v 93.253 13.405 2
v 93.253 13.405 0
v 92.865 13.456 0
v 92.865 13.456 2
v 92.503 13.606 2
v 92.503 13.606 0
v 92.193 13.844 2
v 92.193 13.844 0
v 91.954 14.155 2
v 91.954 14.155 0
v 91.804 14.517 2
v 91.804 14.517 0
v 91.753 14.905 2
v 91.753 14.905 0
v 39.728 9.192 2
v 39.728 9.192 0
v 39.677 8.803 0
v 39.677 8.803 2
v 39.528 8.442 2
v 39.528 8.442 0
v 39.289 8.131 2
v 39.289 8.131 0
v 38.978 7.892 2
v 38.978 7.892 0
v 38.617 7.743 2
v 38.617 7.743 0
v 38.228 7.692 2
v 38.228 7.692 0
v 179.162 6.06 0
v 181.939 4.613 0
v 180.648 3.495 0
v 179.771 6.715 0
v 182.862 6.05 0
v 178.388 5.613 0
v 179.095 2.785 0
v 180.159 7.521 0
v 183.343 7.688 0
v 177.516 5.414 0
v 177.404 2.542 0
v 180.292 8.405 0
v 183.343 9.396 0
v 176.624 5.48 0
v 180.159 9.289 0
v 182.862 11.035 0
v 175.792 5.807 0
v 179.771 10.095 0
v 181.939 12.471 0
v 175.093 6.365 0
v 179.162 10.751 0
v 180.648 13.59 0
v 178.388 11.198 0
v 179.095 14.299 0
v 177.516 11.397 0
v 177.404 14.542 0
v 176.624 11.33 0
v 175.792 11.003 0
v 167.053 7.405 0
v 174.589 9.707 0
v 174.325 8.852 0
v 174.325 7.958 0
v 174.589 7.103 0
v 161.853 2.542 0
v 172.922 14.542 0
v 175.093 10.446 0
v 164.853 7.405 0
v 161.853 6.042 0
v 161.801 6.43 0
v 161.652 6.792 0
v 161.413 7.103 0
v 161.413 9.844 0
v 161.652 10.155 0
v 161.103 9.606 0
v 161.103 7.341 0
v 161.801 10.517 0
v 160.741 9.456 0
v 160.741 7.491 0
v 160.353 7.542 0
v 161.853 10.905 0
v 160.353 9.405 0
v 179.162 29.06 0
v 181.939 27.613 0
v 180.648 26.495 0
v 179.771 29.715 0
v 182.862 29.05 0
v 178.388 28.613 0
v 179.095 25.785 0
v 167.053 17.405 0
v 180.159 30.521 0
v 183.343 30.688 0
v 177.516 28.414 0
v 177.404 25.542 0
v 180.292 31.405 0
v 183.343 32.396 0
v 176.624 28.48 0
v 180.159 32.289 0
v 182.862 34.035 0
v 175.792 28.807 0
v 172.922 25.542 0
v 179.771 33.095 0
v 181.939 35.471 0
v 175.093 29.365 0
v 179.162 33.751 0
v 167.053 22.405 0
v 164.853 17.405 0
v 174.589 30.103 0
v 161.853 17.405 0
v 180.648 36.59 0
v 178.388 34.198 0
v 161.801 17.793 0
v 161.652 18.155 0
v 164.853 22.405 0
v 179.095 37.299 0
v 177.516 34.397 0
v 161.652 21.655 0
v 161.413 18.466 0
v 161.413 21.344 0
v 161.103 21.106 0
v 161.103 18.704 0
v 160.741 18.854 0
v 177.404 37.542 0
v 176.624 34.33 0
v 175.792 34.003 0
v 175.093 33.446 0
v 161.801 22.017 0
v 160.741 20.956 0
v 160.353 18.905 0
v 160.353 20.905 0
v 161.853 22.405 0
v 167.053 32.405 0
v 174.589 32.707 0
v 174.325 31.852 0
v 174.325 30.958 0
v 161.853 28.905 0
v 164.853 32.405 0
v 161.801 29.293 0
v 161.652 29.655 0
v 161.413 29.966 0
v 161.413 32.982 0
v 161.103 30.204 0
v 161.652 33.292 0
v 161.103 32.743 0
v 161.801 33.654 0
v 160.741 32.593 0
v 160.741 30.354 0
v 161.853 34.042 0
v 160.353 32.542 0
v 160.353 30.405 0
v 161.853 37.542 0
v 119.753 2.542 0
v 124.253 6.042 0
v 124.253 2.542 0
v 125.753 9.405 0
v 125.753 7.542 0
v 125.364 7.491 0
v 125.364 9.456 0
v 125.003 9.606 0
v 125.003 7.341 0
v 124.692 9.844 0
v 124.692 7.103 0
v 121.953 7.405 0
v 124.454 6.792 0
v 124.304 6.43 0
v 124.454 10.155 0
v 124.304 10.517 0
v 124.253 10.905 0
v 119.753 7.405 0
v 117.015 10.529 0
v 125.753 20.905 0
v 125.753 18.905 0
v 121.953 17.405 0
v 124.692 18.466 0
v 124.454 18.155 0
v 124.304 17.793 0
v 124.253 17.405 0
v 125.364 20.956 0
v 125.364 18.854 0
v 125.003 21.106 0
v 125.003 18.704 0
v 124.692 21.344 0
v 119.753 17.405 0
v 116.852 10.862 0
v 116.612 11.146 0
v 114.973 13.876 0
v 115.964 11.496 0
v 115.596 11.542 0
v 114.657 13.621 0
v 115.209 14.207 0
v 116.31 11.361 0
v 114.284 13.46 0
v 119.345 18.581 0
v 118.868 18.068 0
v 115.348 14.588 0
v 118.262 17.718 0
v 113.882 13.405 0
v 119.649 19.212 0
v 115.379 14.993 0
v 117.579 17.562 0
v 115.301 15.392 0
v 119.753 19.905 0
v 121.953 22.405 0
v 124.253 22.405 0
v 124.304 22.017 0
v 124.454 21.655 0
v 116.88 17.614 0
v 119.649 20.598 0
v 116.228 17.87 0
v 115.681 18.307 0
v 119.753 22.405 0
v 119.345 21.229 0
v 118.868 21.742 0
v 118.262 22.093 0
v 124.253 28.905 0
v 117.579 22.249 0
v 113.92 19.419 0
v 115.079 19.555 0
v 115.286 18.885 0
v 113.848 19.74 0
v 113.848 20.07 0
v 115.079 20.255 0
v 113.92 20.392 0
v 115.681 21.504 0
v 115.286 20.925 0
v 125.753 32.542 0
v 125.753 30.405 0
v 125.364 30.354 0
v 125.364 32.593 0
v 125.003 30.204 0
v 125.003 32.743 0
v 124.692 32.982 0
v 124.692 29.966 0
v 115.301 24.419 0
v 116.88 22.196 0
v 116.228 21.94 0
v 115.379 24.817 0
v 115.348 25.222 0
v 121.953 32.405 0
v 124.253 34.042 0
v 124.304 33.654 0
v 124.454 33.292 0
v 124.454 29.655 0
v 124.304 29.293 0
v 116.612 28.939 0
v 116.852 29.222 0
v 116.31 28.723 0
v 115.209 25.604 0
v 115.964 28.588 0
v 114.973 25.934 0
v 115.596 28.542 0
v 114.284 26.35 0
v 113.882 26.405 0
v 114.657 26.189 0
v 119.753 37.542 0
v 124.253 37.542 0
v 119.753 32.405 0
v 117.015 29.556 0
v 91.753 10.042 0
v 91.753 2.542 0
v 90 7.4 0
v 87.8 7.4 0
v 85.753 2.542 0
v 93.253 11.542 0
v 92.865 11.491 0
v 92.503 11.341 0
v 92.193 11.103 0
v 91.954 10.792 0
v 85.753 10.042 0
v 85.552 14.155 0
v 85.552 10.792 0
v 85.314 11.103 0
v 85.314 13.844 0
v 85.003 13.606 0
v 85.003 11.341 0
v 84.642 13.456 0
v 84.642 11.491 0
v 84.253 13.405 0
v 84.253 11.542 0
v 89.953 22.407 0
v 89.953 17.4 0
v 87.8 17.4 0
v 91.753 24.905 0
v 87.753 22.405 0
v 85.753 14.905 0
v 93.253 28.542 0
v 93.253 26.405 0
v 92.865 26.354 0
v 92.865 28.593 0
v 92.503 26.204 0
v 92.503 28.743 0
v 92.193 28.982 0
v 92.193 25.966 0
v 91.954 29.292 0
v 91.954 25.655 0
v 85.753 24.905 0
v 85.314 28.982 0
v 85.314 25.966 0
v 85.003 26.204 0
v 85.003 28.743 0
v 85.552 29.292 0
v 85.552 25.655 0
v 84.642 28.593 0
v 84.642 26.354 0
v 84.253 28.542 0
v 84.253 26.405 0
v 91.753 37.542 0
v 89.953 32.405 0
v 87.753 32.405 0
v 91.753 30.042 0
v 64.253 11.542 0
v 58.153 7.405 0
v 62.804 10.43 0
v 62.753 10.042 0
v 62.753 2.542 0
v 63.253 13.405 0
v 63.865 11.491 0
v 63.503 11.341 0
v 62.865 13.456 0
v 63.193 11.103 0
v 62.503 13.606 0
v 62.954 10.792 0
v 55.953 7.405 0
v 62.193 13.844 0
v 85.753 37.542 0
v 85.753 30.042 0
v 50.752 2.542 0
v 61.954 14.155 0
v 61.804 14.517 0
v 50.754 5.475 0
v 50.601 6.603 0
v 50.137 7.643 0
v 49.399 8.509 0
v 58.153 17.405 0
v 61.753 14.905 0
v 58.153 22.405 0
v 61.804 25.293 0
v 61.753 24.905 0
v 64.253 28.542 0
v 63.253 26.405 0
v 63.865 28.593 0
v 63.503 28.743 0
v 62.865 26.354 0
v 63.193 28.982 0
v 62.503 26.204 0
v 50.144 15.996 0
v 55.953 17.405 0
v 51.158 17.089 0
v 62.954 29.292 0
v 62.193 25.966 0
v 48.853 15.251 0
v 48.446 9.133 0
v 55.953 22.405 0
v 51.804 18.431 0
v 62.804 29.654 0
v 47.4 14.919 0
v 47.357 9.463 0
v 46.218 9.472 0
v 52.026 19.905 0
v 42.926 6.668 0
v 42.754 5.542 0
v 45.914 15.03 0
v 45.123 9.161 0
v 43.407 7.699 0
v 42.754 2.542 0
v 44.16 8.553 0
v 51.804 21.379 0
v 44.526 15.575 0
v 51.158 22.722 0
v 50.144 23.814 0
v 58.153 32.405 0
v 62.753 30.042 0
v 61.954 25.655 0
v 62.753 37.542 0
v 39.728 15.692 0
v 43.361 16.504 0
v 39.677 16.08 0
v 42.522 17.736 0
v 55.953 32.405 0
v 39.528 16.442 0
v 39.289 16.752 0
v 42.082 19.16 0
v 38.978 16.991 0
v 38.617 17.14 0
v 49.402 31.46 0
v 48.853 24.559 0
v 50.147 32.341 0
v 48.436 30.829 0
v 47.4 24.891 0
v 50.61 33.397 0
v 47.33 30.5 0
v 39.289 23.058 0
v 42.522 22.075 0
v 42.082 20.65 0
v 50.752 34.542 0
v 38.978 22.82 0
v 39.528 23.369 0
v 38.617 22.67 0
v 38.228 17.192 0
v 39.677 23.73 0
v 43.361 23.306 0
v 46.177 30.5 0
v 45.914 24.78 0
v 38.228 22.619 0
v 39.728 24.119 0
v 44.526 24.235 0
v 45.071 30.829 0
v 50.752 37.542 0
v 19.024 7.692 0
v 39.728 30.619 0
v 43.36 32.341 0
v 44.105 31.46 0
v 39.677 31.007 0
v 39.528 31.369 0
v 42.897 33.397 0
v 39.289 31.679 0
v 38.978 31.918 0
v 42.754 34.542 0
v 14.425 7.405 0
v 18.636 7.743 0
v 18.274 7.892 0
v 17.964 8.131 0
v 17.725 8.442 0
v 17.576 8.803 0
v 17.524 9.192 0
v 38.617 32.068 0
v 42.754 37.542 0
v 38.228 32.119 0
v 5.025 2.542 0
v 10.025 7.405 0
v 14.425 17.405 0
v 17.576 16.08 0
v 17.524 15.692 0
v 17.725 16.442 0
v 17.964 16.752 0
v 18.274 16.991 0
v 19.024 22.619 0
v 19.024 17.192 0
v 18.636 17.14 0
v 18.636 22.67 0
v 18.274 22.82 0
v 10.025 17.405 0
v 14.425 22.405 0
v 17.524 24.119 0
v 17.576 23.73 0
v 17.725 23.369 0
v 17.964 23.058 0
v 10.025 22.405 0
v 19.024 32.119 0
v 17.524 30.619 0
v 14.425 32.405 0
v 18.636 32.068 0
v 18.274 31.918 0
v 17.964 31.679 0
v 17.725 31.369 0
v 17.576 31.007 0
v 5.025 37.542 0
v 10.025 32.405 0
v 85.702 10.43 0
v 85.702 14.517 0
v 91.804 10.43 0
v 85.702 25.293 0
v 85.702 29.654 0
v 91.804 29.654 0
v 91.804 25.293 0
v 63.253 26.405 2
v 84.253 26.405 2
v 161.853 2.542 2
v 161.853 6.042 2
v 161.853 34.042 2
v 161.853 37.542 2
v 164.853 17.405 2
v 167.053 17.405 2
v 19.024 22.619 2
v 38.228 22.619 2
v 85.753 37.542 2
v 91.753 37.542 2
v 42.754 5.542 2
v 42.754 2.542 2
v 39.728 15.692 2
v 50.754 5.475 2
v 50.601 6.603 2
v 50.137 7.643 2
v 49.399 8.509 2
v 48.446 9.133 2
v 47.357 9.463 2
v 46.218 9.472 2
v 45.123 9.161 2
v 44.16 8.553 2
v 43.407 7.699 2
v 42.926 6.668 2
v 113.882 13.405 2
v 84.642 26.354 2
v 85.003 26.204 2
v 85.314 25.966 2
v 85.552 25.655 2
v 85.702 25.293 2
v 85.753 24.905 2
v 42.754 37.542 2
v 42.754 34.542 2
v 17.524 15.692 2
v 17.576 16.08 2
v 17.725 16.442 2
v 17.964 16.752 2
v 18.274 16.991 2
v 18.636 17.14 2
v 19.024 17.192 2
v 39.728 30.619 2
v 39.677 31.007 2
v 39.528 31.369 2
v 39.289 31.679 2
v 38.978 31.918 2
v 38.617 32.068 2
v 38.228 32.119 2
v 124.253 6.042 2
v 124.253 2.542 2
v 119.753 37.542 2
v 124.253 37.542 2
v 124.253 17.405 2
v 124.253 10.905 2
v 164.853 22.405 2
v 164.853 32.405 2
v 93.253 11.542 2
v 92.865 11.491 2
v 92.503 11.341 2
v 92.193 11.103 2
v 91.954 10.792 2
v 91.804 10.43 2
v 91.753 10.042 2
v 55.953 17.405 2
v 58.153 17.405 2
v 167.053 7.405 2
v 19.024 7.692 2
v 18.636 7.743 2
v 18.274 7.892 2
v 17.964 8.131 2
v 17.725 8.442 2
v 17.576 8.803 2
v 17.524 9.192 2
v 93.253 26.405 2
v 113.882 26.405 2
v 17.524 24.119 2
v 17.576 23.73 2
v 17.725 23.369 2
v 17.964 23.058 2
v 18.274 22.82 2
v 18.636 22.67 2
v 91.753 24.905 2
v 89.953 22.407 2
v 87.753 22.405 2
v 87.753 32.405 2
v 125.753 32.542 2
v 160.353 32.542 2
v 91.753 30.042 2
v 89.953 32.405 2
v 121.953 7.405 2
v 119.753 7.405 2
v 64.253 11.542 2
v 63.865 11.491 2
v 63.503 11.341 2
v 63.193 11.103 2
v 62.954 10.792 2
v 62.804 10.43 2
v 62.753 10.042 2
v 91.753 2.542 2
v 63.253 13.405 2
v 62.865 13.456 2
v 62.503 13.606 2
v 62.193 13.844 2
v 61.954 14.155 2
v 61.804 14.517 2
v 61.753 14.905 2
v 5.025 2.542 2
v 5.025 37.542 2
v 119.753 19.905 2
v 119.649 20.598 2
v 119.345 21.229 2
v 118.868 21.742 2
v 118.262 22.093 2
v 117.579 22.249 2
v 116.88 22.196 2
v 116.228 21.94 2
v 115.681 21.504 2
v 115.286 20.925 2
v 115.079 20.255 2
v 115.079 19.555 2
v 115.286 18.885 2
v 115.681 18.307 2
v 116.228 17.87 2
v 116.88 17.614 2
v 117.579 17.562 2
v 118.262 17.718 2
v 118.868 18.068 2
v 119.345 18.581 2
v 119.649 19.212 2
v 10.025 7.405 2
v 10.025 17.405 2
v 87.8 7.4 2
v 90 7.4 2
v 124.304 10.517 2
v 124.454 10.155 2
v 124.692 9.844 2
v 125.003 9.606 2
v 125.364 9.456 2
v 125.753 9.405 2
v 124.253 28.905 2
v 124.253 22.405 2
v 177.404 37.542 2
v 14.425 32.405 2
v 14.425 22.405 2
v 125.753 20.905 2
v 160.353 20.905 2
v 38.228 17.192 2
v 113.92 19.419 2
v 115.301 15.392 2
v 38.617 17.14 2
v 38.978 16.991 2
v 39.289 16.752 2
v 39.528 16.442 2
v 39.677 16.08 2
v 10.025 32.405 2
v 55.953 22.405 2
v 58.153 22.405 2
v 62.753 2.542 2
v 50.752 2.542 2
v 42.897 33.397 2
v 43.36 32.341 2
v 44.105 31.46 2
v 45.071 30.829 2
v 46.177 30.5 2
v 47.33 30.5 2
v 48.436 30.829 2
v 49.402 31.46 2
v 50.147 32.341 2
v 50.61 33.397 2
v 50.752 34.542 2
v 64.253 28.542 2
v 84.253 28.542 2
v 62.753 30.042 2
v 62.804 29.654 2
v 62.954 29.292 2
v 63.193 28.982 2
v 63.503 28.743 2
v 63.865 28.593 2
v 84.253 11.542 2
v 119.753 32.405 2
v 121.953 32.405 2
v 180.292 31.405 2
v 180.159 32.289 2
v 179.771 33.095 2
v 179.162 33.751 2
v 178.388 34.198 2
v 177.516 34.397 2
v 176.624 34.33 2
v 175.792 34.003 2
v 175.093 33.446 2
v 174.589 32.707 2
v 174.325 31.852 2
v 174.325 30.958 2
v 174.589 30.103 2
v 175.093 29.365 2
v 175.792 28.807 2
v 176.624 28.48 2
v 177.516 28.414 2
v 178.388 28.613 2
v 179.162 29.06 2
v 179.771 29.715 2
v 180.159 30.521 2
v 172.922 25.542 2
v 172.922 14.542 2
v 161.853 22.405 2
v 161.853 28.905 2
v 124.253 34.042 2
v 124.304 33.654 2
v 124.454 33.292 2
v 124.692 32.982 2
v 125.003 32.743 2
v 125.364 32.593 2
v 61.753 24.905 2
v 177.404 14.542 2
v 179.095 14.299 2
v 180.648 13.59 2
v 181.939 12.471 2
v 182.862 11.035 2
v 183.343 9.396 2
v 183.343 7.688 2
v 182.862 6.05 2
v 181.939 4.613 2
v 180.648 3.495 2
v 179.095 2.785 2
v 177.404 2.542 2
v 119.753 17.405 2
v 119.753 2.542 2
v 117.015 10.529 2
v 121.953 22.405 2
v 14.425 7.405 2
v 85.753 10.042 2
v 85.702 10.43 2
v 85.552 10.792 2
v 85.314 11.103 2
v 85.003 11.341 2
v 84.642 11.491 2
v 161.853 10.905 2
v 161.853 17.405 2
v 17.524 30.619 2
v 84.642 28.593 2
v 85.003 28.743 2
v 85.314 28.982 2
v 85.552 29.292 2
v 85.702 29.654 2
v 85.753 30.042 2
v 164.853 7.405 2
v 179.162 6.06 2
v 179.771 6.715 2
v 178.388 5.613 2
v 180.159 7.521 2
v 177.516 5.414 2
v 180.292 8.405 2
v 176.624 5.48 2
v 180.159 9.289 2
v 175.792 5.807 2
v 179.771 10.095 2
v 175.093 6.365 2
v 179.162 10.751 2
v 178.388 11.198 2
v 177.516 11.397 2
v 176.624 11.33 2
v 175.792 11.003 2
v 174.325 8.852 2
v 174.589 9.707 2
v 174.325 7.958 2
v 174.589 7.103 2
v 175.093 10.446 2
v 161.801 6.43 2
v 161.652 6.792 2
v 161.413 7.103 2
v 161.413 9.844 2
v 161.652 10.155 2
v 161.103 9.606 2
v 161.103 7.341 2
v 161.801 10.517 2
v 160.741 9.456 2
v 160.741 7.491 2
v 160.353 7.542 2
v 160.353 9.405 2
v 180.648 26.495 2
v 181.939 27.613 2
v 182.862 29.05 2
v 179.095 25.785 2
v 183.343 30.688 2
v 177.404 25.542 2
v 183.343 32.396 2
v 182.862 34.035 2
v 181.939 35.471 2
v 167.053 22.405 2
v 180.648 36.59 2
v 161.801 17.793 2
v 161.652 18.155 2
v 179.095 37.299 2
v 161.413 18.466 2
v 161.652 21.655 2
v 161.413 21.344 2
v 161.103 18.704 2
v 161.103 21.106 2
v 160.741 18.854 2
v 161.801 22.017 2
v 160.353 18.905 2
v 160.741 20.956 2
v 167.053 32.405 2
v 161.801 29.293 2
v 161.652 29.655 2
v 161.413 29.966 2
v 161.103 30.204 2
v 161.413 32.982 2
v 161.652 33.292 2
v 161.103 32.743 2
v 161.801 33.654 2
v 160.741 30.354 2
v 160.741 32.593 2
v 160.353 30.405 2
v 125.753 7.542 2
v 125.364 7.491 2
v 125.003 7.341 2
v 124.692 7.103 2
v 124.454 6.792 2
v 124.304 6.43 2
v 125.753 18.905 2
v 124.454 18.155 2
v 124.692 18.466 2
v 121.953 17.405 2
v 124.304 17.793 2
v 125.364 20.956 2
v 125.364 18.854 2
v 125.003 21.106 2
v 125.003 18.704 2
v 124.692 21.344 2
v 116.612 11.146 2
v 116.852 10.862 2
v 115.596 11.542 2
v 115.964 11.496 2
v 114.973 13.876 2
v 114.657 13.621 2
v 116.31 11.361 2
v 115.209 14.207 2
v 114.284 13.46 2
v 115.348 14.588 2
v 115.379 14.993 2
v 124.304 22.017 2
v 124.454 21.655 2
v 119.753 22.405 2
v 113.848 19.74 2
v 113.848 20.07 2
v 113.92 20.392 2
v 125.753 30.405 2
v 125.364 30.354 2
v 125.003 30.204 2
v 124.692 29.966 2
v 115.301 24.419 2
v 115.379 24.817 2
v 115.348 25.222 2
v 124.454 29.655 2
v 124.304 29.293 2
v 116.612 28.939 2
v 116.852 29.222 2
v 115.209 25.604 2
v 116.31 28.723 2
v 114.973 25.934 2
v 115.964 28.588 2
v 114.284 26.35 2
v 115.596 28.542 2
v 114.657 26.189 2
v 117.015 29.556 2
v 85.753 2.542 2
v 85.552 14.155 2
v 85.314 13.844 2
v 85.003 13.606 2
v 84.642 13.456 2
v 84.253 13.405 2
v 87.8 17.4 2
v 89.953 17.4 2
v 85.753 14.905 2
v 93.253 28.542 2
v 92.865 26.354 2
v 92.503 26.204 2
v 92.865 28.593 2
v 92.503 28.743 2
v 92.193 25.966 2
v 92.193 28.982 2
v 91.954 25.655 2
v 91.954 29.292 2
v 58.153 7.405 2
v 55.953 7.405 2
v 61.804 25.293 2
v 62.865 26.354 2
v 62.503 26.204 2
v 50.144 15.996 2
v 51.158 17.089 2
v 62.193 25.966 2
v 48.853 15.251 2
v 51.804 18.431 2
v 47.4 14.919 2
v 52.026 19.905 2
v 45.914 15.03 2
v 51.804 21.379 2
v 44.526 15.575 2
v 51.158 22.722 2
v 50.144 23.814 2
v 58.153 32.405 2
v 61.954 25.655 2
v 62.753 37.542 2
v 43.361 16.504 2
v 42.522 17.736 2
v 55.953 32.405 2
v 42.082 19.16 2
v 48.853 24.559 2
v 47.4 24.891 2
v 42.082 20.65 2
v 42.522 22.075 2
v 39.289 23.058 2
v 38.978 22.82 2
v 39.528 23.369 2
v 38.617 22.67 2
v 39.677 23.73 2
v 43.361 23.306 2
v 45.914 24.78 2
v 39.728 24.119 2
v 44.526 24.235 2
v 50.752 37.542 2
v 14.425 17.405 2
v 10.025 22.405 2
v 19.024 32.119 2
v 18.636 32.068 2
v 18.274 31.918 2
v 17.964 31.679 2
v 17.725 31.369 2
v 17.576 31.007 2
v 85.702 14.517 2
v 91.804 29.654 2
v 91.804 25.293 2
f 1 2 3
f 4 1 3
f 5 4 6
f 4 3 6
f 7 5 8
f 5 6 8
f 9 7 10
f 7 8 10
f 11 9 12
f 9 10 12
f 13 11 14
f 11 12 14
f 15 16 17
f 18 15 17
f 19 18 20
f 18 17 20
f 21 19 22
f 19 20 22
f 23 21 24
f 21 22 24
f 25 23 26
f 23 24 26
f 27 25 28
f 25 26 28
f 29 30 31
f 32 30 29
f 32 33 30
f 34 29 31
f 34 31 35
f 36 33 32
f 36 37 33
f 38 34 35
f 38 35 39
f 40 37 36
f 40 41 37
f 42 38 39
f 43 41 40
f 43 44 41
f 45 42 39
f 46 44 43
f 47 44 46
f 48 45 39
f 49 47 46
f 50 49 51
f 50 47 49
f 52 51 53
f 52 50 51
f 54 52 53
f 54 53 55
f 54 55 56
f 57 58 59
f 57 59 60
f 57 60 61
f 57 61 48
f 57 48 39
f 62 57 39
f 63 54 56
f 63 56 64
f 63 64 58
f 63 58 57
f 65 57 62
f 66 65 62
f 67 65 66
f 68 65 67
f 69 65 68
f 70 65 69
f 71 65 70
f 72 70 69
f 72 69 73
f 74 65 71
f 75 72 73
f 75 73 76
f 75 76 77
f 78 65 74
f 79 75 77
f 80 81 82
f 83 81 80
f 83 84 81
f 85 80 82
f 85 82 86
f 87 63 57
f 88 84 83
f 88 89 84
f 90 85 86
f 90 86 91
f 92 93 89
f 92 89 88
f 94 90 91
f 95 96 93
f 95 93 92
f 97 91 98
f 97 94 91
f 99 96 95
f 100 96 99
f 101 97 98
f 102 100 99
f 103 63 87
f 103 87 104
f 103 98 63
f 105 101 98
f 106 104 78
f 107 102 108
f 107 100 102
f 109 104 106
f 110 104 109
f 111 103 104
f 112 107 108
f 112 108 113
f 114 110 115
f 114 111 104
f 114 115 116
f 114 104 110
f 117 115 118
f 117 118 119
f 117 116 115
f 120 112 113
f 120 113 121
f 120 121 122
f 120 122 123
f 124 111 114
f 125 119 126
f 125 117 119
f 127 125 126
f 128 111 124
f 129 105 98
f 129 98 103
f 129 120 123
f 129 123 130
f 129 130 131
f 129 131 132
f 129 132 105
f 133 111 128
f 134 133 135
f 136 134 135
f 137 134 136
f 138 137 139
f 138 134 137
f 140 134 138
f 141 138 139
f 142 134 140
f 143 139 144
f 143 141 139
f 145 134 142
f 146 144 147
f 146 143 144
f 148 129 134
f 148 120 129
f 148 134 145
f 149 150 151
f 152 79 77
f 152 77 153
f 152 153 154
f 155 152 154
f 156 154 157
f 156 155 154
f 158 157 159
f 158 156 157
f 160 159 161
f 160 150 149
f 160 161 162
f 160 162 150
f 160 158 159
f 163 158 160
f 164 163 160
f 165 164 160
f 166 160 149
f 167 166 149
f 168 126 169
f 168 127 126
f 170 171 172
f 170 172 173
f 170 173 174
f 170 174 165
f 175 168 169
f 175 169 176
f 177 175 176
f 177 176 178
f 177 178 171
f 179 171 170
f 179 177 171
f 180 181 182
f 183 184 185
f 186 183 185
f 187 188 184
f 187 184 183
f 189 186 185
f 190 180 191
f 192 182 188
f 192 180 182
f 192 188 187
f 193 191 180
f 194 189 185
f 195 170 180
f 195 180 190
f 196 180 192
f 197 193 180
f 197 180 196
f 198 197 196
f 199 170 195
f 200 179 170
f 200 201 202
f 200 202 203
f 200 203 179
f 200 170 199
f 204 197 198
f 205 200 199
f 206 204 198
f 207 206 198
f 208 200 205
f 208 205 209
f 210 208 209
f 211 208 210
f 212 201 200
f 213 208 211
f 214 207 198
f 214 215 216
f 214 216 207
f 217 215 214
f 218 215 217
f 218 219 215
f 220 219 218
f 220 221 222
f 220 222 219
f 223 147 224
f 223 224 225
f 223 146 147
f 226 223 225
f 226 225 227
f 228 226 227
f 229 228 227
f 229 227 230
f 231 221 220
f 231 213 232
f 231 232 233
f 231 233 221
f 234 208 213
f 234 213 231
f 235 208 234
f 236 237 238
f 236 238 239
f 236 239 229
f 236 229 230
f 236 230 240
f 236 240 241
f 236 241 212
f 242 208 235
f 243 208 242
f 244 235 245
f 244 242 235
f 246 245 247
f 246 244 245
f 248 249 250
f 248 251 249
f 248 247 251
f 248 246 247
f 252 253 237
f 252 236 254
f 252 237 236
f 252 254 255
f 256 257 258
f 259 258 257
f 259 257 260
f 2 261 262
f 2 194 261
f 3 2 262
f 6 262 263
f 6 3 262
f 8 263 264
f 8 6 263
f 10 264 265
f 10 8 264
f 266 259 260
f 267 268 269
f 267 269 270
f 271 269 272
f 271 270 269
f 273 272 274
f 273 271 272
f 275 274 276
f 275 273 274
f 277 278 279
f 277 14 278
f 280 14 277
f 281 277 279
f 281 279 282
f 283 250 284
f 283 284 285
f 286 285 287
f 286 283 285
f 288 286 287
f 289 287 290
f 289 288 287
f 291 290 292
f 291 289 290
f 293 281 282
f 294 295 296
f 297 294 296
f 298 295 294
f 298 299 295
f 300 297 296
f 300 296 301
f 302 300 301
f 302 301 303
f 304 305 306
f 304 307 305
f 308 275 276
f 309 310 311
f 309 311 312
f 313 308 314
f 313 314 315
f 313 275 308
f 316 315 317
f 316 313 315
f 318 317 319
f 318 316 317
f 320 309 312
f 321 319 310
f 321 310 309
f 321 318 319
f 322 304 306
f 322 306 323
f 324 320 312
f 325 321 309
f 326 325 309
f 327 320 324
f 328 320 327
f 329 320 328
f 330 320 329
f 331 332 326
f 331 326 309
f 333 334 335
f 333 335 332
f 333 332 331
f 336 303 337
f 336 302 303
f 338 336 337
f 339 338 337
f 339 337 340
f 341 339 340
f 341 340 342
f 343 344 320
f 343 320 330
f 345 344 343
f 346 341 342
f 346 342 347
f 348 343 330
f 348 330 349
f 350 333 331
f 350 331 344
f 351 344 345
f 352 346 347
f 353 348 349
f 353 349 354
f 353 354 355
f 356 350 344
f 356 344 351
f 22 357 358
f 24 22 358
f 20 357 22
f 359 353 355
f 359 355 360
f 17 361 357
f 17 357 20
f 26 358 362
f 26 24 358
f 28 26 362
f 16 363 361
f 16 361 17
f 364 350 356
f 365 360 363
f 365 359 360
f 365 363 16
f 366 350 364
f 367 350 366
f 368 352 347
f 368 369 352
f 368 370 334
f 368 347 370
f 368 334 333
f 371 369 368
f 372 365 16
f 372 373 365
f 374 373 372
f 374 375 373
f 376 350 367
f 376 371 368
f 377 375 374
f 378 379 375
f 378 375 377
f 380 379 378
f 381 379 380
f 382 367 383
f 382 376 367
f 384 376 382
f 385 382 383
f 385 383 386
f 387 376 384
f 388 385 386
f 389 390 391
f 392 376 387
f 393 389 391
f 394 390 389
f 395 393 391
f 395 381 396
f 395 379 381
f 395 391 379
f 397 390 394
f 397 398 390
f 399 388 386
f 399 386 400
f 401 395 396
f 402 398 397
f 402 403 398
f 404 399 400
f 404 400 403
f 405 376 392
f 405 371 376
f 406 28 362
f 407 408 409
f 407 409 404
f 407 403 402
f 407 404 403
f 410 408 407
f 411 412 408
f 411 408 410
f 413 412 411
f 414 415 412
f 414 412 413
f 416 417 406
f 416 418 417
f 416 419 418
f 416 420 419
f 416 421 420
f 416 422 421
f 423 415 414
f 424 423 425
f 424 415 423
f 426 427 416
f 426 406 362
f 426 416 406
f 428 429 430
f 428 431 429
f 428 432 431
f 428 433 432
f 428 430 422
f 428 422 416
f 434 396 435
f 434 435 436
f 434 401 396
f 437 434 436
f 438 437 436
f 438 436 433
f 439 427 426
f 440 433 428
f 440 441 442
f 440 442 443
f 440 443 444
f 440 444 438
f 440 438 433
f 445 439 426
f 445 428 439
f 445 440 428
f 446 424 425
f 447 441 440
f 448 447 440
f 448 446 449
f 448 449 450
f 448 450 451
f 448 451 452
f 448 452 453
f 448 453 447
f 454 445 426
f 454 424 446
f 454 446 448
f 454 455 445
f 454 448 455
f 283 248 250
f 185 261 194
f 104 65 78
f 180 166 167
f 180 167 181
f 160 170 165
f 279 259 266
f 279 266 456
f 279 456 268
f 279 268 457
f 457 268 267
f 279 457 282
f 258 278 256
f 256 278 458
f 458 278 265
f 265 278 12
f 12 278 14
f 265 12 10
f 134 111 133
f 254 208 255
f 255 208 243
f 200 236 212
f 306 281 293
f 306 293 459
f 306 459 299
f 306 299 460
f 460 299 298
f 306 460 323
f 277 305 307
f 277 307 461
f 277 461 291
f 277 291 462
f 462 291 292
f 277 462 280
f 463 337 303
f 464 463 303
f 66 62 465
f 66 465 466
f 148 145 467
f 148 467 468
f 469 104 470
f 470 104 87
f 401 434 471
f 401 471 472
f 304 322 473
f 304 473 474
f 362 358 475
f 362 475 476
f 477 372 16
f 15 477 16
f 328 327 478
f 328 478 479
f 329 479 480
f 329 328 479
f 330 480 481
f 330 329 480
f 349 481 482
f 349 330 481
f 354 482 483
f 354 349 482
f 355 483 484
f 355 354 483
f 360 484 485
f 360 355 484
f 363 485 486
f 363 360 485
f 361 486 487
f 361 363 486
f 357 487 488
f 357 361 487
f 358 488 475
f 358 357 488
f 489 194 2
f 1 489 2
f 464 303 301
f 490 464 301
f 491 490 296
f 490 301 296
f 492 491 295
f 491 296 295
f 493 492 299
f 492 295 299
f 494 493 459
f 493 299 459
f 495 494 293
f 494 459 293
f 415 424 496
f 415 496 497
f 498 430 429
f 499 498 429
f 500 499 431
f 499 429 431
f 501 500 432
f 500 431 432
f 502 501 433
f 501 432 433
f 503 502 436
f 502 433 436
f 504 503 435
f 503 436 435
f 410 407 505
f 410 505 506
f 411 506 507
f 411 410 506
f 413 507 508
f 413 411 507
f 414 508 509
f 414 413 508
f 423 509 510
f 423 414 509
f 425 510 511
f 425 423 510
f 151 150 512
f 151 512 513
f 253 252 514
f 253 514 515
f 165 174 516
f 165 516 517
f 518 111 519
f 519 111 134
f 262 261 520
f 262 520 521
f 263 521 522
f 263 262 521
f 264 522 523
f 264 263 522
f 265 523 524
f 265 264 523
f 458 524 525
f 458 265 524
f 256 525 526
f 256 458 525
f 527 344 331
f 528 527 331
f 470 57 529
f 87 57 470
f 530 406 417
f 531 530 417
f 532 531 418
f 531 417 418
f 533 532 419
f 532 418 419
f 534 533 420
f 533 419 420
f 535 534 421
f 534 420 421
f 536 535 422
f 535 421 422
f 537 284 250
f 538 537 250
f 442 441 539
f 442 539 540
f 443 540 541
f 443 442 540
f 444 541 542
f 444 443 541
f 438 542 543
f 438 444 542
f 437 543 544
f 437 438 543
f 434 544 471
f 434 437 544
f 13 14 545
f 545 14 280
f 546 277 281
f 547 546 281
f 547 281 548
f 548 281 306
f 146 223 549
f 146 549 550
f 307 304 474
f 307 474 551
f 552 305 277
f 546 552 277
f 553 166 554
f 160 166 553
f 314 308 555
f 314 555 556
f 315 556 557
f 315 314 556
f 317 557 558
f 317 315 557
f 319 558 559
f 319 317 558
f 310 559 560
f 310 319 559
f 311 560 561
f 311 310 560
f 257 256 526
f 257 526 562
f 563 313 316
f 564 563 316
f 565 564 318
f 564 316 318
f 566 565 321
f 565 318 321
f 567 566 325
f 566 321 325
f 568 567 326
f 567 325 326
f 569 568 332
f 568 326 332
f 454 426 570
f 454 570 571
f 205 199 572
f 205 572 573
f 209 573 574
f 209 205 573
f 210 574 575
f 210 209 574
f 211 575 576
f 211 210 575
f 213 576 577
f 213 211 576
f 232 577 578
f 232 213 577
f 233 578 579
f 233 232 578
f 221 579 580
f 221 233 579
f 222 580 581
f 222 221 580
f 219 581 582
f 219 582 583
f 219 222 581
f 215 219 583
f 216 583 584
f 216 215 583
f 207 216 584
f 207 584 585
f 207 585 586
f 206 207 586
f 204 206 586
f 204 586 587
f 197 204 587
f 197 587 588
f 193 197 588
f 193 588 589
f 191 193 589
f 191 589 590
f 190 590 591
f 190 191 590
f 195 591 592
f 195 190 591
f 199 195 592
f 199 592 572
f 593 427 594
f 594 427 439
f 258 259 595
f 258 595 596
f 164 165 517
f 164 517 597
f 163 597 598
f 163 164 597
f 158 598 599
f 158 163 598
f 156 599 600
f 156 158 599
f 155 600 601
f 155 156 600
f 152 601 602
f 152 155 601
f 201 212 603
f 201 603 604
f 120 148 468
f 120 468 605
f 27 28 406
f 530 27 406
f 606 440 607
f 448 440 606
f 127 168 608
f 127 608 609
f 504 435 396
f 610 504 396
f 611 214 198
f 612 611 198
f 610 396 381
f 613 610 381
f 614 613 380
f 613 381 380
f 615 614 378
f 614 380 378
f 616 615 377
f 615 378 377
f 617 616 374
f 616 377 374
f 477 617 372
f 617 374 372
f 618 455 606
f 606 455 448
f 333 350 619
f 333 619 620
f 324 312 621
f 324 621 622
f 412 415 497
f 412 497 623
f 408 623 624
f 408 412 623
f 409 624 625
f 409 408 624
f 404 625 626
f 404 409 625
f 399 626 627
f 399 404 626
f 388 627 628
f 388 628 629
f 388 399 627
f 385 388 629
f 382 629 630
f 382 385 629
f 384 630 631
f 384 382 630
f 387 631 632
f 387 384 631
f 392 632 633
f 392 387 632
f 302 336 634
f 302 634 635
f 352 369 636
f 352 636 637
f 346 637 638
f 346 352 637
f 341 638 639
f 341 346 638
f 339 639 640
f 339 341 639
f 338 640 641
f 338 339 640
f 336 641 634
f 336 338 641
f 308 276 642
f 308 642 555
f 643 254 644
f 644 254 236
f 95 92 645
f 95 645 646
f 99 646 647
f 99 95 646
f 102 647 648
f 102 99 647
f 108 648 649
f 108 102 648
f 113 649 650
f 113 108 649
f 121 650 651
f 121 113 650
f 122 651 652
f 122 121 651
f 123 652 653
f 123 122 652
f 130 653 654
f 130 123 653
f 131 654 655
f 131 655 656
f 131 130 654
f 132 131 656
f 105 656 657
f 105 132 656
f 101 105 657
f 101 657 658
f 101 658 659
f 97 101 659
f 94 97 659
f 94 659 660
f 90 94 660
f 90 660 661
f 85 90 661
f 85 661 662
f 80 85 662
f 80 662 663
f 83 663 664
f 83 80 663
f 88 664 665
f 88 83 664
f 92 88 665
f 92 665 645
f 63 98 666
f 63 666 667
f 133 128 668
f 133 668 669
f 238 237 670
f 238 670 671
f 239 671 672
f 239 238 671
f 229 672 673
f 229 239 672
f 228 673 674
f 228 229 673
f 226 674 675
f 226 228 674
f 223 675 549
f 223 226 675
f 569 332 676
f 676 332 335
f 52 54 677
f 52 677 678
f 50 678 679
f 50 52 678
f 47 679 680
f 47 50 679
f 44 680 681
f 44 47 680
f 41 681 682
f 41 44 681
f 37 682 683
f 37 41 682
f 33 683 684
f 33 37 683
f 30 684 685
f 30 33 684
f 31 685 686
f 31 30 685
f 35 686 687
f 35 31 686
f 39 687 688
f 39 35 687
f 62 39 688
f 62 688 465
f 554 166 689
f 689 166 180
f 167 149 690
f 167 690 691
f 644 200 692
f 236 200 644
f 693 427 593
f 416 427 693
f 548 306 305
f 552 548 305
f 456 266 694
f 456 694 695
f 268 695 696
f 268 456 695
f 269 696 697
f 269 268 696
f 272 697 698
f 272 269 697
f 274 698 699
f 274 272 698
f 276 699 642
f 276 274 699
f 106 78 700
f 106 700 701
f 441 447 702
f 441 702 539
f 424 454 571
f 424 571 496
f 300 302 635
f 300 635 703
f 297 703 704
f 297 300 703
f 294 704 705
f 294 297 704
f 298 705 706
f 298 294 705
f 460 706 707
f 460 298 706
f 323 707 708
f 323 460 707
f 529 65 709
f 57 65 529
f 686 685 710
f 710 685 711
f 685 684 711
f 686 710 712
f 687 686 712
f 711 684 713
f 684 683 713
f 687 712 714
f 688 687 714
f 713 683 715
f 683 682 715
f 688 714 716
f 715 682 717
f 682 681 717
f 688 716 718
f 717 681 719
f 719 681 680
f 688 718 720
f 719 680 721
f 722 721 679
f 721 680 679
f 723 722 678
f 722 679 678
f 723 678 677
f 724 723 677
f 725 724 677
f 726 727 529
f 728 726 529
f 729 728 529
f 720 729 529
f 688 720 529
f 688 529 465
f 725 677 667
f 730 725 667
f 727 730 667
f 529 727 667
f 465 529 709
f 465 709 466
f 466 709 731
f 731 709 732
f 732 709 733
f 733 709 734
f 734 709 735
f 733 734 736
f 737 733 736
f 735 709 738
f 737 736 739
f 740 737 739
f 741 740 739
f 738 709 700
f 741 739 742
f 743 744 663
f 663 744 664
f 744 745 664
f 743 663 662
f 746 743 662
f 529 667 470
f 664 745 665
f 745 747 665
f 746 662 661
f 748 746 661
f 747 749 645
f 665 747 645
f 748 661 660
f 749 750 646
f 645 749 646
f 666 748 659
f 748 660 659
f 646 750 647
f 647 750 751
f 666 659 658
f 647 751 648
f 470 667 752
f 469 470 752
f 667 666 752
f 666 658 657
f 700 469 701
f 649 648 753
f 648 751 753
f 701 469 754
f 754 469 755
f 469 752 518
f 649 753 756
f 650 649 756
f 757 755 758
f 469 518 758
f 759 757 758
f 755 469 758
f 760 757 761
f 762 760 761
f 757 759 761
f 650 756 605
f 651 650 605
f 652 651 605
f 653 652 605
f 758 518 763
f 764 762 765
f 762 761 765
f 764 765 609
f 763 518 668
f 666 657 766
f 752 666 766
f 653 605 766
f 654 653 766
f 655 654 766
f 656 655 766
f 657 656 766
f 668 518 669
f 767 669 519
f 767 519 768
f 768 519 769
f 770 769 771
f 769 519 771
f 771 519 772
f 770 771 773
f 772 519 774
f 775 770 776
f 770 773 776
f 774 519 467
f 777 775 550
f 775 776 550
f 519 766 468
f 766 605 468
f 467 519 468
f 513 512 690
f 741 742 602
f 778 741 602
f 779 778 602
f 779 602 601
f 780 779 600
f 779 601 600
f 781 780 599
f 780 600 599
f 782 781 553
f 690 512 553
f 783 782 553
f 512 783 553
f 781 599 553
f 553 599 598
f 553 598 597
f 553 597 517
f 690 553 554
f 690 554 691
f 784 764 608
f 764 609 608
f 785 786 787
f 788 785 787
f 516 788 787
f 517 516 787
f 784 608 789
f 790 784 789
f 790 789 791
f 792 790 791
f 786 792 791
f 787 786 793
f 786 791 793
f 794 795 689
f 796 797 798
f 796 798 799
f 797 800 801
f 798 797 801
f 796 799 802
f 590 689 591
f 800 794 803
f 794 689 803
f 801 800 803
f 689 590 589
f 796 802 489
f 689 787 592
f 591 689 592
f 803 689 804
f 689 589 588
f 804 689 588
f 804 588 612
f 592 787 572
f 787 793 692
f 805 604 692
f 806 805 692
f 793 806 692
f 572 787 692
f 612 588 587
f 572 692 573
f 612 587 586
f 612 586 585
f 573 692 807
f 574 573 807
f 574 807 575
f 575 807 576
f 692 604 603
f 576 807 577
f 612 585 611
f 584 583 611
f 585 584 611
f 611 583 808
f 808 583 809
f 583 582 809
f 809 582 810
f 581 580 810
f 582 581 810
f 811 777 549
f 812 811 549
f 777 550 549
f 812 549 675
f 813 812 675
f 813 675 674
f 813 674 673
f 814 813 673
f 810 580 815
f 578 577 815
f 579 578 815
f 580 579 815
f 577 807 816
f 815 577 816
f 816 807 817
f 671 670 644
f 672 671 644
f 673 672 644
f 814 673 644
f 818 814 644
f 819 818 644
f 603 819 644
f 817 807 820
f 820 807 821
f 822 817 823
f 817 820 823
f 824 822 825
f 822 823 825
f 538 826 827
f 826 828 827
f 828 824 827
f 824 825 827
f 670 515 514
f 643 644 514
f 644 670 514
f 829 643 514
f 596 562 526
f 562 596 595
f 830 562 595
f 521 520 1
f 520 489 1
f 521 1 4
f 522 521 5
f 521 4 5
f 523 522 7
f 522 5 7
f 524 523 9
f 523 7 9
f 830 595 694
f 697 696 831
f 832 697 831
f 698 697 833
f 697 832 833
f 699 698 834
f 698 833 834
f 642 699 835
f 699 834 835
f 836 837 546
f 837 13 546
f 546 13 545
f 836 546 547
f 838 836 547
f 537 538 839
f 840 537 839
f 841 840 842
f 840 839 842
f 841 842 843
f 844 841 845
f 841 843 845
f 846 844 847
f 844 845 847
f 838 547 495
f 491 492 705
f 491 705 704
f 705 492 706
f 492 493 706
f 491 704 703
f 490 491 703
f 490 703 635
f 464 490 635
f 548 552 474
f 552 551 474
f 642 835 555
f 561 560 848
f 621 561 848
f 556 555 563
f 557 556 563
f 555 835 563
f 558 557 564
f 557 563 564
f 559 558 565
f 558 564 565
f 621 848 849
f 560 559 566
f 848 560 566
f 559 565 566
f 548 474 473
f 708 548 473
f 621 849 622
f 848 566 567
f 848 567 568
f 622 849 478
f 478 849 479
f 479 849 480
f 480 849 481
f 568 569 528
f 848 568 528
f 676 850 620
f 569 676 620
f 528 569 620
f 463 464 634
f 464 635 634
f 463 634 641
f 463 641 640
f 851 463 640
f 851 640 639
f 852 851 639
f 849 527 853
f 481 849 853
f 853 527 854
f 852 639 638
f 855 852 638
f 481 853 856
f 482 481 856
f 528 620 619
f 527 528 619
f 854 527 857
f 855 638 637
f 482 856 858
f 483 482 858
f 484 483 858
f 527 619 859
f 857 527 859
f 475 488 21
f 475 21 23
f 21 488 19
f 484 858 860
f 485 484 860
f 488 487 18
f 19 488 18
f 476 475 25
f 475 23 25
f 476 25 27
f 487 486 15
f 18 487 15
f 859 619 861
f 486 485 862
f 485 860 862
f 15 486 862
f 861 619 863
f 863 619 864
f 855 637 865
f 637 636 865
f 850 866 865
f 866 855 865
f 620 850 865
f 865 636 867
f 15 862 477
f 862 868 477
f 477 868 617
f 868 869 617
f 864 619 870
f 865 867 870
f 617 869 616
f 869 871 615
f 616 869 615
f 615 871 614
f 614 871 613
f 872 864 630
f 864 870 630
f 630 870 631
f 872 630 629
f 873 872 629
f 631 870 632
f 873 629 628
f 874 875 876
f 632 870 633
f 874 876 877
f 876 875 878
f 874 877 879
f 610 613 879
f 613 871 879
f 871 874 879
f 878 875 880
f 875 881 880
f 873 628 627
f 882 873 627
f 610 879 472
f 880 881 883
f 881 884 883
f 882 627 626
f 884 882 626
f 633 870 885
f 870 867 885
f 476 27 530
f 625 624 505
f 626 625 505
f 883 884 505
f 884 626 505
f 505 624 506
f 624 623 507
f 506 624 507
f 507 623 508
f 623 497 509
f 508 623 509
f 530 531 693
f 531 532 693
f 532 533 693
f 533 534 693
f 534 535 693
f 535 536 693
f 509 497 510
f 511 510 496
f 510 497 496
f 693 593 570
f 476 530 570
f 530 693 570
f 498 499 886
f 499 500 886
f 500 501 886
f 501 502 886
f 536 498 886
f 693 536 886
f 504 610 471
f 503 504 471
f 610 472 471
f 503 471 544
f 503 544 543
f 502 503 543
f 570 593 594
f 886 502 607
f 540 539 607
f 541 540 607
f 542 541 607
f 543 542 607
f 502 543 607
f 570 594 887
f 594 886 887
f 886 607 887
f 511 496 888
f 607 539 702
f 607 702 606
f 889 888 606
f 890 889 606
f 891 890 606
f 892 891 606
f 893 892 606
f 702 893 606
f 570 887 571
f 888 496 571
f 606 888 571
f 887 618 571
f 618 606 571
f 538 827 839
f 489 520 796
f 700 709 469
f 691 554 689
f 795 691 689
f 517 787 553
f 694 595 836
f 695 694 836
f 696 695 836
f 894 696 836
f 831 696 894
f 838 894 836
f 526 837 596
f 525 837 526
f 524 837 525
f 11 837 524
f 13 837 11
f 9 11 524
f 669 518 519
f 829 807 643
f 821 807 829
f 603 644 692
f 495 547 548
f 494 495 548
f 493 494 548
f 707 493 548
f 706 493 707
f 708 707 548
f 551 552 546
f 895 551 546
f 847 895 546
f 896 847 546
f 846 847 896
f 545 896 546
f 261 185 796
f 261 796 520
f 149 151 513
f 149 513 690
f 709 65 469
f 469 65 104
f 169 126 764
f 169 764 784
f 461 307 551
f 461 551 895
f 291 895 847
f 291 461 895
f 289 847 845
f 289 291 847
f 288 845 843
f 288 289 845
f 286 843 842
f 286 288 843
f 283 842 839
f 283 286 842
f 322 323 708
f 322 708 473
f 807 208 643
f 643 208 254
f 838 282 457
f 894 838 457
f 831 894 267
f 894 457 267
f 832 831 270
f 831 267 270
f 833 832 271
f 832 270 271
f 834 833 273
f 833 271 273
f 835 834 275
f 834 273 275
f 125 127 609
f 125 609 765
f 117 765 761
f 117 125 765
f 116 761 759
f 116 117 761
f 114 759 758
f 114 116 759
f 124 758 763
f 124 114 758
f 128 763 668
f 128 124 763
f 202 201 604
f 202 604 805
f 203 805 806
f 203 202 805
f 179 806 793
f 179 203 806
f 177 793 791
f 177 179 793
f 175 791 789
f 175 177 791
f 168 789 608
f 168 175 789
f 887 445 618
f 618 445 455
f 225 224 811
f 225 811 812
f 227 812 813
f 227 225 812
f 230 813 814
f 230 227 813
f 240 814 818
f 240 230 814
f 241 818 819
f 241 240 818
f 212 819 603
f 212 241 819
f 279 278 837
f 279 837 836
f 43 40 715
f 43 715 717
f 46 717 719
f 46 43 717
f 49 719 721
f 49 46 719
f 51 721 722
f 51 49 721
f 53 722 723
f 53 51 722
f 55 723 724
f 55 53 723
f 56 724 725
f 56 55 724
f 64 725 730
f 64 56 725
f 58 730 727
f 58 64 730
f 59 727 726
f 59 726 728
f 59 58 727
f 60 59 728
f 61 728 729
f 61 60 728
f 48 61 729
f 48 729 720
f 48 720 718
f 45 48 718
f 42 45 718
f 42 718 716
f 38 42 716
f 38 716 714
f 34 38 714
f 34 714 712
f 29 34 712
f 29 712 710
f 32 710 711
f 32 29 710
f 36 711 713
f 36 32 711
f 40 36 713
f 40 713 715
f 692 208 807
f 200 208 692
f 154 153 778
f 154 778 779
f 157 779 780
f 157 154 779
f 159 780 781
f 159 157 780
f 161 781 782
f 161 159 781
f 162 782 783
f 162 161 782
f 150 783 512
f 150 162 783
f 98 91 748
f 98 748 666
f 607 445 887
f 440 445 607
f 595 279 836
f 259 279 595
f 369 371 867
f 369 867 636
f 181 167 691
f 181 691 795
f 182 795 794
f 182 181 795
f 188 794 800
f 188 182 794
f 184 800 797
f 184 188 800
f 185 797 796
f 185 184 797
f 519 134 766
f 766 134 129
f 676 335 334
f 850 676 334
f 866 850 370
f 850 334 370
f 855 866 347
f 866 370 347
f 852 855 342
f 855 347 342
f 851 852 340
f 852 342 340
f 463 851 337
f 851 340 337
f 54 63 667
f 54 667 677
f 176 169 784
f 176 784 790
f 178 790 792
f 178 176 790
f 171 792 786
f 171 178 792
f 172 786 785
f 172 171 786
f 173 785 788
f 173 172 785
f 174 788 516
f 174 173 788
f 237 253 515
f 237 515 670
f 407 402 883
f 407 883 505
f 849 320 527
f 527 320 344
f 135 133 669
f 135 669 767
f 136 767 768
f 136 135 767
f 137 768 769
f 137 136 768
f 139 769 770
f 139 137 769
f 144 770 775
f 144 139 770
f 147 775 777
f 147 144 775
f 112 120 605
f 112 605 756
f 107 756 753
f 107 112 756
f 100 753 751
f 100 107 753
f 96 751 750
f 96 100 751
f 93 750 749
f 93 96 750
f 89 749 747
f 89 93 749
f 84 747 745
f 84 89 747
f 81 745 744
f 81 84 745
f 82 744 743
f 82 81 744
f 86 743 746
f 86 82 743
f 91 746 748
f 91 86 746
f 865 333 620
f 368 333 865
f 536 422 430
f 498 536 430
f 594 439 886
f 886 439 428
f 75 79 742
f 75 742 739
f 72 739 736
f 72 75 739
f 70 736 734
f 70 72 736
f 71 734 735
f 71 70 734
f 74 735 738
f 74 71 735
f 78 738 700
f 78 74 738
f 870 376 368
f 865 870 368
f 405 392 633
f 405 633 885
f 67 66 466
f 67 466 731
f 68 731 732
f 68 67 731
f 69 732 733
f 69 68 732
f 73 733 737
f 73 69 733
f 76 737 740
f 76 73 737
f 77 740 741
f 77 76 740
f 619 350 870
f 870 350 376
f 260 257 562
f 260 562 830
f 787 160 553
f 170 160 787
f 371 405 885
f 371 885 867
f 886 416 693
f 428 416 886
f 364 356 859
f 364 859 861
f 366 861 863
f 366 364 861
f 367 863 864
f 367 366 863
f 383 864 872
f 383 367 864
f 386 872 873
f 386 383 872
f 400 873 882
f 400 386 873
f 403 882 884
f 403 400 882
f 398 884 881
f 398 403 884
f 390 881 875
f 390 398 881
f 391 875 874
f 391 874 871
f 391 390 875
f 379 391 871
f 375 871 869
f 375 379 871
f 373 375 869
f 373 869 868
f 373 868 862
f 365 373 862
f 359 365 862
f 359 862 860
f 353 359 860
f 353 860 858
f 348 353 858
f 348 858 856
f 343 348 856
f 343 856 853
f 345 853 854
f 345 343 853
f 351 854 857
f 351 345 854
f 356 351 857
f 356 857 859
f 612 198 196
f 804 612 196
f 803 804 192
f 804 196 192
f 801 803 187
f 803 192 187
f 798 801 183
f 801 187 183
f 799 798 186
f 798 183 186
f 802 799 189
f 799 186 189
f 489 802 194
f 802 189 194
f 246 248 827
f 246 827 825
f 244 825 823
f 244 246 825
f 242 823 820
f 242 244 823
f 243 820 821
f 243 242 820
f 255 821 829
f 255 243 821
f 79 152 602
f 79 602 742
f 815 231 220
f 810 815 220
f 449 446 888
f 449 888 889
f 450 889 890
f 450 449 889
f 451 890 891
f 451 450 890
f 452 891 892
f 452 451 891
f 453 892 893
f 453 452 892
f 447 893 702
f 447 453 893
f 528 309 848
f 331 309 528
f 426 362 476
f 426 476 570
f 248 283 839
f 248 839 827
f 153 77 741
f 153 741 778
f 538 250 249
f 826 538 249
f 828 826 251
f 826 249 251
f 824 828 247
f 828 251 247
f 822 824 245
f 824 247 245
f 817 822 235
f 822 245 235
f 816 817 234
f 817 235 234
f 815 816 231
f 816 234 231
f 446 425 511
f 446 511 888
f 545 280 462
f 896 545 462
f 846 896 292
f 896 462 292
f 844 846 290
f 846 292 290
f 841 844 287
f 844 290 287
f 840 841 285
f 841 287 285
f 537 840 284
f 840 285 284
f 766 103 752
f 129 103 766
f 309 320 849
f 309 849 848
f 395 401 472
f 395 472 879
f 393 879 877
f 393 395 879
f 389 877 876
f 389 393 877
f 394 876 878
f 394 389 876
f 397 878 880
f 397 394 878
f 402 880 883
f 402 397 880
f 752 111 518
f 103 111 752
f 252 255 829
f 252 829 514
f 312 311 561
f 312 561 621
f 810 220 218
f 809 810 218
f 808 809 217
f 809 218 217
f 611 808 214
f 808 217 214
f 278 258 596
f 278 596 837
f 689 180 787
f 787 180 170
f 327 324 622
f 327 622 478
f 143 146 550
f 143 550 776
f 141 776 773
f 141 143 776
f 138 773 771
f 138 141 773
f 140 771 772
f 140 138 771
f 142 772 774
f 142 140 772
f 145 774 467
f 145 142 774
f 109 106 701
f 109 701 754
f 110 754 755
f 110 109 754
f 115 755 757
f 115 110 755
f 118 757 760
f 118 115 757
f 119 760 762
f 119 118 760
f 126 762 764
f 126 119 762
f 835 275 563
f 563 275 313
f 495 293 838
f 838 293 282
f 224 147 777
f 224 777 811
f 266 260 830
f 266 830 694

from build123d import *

# Parameters (mm, degrees)
MODEL_R         = 3
MODEL_R_2       = 2.35
MODEL_R_3       = 5
MODEL_W         = 2.2
MODEL_H         = 10
MODEL_W_2       = 4.4
EXTRUDE_1_DEPTH = 2


with BuildPart() as part:
    # Model → 凸台-拉伸1 (new body)
    with BuildSketch(Plane.XY):
        with BuildLine():
            Line((42.75436257, 5.542220319), (42.75436257, 2.542220319))
            Line((42.75436257, 2.542220319), (5.024750427, 2.542220319))
            Line((5.024750427, 2.542220319), (5.024750427, 37.542220319))
            Line((5.024750427, 37.542220319), (42.75436257, 37.542220319))
            Line((42.75436257, 37.542220319), (42.75436257, 34.542220319))
            ThreePointArc((42.75436257, 34.542220319), (46.753332445, 30.45804663), (50.75230232, 34.542220319))
            Line((50.75230232, 34.542220319), (50.75230232, 37.542220319))
            Line((50.75230232, 37.542220319), (62.753332445, 37.542220319))
            Line((62.753332445, 37.542220319), (62.753332445, 30.042220319))
            ThreePointArc((62.753332445, 30.042220319), (63.192672273, 28.981560148), (64.253332445, 28.542220319))
            Line((64.253332445, 28.542220319), (84.253332445, 28.542220319))
            ThreePointArc((84.253332445, 28.542220319), (85.313992617, 28.981560148), (85.753332445, 30.042220319))
            Line((85.753332445, 30.042220319), (85.753332445, 37.542220319))
            Line((85.753332445, 37.542220319), (91.753332445, 37.542220319))
            Line((91.753332445, 37.542220319), (91.753332445, 30.042220319))
            ThreePointArc((91.753332445, 30.042220319), (92.192672273, 28.981560148), (93.253332445, 28.542220319))
            Line((93.253332445, 28.542220319), (115.596034226, 28.542220319))
            ThreePointArc((115.596034226, 28.542220319), (116.467891517, 28.821620113), (117.014953145, 29.555733833))
            Line((117.014953145, 29.555733833), (119.753177083, 37.542220319))
            Line((119.753177083, 37.542220319), (124.252549671, 37.542220319))
            Line((124.252549671, 37.542220319), (124.252549671, 34.042220319))
            ThreePointArc((124.252549671, 34.042220319), (124.6918895, 32.981560148), (125.752549671, 32.542220319))
            Line((125.752549671, 32.542220319), (160.352549671, 32.542220319))
            ThreePointArc((160.352549671, 32.542220319), (161.413209843, 32.981560148), (161.852549671, 34.042220319))
            Line((161.852549671, 34.042220319), (161.852549671, 37.542220319))
            Line((161.852549671, 37.542220319), (177.404402917, 37.542220319))
            ThreePointArc((177.404402917, 37.542220319), (183.404402917, 31.542220319), (177.404402917, 25.542220319))
            Line((177.404402917, 25.542220319), (172.92249216, 25.542220319))
            Line((172.92249216, 25.542220319), (172.92249216, 14.542220319))
            Line((172.92249216, 14.542220319), (177.404402917, 14.542220319))
            ThreePointArc((177.404402917, 14.542220319), (183.404402917, 8.542220319), (177.404402917, 2.542220319))
            Line((177.404402917, 2.542220319), (161.852549671, 2.542220319))
            Line((161.852549671, 2.542220319), (161.852549671, 6.042220319))
            ThreePointArc((161.852549671, 6.042220319), (161.413209843, 7.102880491), (160.352549671, 7.542220319))
            Line((160.352549671, 7.542220319), (125.752549671, 7.542220319))
            ThreePointArc((125.752549671, 7.542220319), (124.6918895, 7.102880491), (124.252549671, 6.042220319))
            Line((124.252549671, 6.042220319), (124.252549671, 2.542220319))
            Line((124.252549671, 2.542220319), (119.753177083, 2.542220319))
            Line((119.753177083, 2.542220319), (117.014953145, 10.528706806))
            ThreePointArc((117.014953145, 10.528706806), (116.467891517, 11.262820526), (115.596034226, 11.542220319))
            Line((115.596034226, 11.542220319), (93.253332445, 11.542220319))
            ThreePointArc((93.253332445, 11.542220319), (92.192672273, 11.102880491), (91.753332445, 10.042220319))
            Line((91.753332445, 10.042220319), (91.753332445, 2.542220319))
            Line((91.753332445, 2.542220319), (85.753332445, 2.542220319))
            Line((85.753332445, 2.542220319), (85.753332445, 10.042220319))
            ThreePointArc((85.753332445, 10.042220319), (85.313992617, 11.102880491), (84.253332445, 11.542220319))
            Line((84.253332445, 11.542220319), (64.253332445, 11.542220319))
            ThreePointArc((64.253332445, 11.542220319), (63.192672273, 11.102880491), (62.753332445, 10.042220319))
            Line((62.753332445, 10.042220319), (62.753332445, 2.542220319))
            Line((62.753332445, 2.542220319), (50.75230232, 2.542220319))
            Line((50.75230232, 2.542220319), (50.753797115, 5.474964717))
            ThreePointArc((50.753797115, 5.474964717), (46.787707643, 9.508309791), (42.75436257, 5.542220319))
        make_face()
        with Locations((177.291852583, 31.405122008)):
            Circle(MODEL_R, mode=Mode.SUBTRACT)
        with Locations((177.291852583, 8.405122008)):
            Circle(MODEL_R, mode=Mode.SUBTRACT)
        with Locations((117.403177083, 19.905122008)):
            Circle(MODEL_R_2, mode=Mode.SUBTRACT)
        with Locations((47.026395841, 19.905122008)):
            Circle(MODEL_R_3, mode=Mode.SUBTRACT)
        with Locations((57.053332445, 27.405122008)):
            Rectangle(MODEL_W, MODEL_H, mode=Mode.SUBTRACT)
        with Locations((57.053332445, 12.405122008)):
            Rectangle(MODEL_W, MODEL_H, mode=Mode.SUBTRACT)
        with Locations((165.952549671, 27.405122008)):
            Rectangle(MODEL_W, MODEL_H, mode=Mode.SUBTRACT)
        with Locations((165.952549671, 12.405122008)):
            Rectangle(MODEL_W, MODEL_H, mode=Mode.SUBTRACT)
        with Locations((120.853177083, 27.405122008)):
            Rectangle(MODEL_W, MODEL_H, mode=Mode.SUBTRACT)
        with Locations((120.853177083, 12.405122008)):
            Rectangle(MODEL_W, MODEL_H, mode=Mode.SUBTRACT)
        Polygon((87.753332445, 32.405122008), (89.953332445, 32.405122008), (89.953318849, 22.40745396), (87.753332445, 22.405122008), align=None, mode=Mode.SUBTRACT)
        Polygon((87.799905777, 7.3998381), (89.999905777, 7.3998381), (89.953262633, 17.3998381), (87.799905777, 17.3998381), align=None, mode=Mode.SUBTRACT)
        with BuildLine():
            Line((63.253332445, 26.405122008), (84.253332445, 26.405122008))
            ThreePointArc((84.253332445, 26.405122008), (85.313992617, 25.96578218), (85.753332445, 24.905122008))
            Line((85.753332445, 24.905122008), (85.753332445, 14.905122008))
            ThreePointArc((85.753332445, 14.905122008), (85.313992617, 13.844461836), (84.253332445, 13.405122008))
            Line((84.253332445, 13.405122008), (63.253332445, 13.405122008))
            ThreePointArc((63.253332445, 13.405122008), (62.192672273, 13.844461836), (61.753332445, 14.905122008))
            Line((61.753332445, 14.905122008), (61.753332445, 24.905122008))
            ThreePointArc((61.753332445, 24.905122008), (62.192672273, 25.96578218), (63.253332445, 26.405122008))
        make_face(mode=Mode.SUBTRACT)
        with BuildLine():
            Line((113.881748512, 13.405122008), (93.253332445, 13.405122008))
            ThreePointArc((93.253332445, 13.405122008), (92.192672273, 13.844461836), (91.753332445, 14.905122008))
            Line((91.753332445, 14.905122008), (91.753332445, 24.905122008))
            ThreePointArc((91.753332445, 24.905122008), (92.192672273, 25.96578218), (93.253332445, 26.405122008))
            Line((93.253332445, 26.405122008), (113.881748512, 26.405122008))
            ThreePointArc((113.881748512, 26.405122008), (115.102348719, 25.776979299), (115.300667431, 24.418635521))
            Line((115.300667431, 24.418635521), (113.91997245, 20.391608494))
            ThreePointArc((113.91997245, 20.391608494), (113.838891369, 19.905122008), (113.91997245, 19.418635521))
            Line((113.91997245, 19.418635521), (115.300667431, 15.391608494))
            ThreePointArc((115.300667431, 15.391608494), (115.102348719, 14.033264717), (113.881748512, 13.405122008))
        make_face(mode=Mode.SUBTRACT)
        with BuildLine():
            Line((161.852549671, 22.405122008), (161.852549671, 28.905122008))
            ThreePointArc((161.852549671, 28.905122008), (161.413209843, 29.96578218), (160.352549671, 30.405122008))
            Line((160.352549671, 30.405122008), (125.752549671, 30.405122008))
            ThreePointArc((125.752549671, 30.405122008), (124.6918895, 29.96578218), (124.252549671, 28.905122008))
            Line((124.252549671, 28.905122008), (124.252549671, 22.405122008))
            ThreePointArc((124.252549671, 22.405122008), (124.6918895, 21.344461836), (125.752549671, 20.905122008))
            Line((125.752549671, 20.905122008), (160.352549671, 20.905122008))
            ThreePointArc((160.352549671, 20.905122008), (161.413209843, 21.344461836), (161.852549671, 22.405122008))
        make_face(mode=Mode.SUBTRACT)
        with BuildLine():
            Line((124.252549671, 17.405122008), (124.252549671, 10.905122008))
            ThreePointArc((124.252549671, 10.905122008), (124.6918895, 9.844461836), (125.752549671, 9.405122008))
            Line((125.752549671, 9.405122008), (160.352549671, 9.405122008))
            ThreePointArc((160.352549671, 9.405122008), (161.413209843, 9.844461836), (161.852549671, 10.905122008))
            Line((161.852549671, 10.905122008), (161.852549671, 17.405122008))
            ThreePointArc((161.852549671, 17.405122008), (161.413209843, 18.46578218), (160.352549671, 18.905122008))
            Line((160.352549671, 18.905122008), (125.752549671, 18.905122008))
            ThreePointArc((125.752549671, 18.905122008), (124.6918895, 18.46578218), (124.252549671, 17.405122008))
        make_face(mode=Mode.SUBTRACT)
        with Locations((12.224750427, 27.405122008)):
            Rectangle(MODEL_W_2, MODEL_H, mode=Mode.SUBTRACT)
        with Locations((12.224750427, 12.405122008)):
            Rectangle(MODEL_W_2, MODEL_H, mode=Mode.SUBTRACT)
        with BuildLine():
            Line((19.024477888, 17.191523075), (38.228465706, 17.191523075))
            ThreePointArc((38.228465706, 17.191523075), (39.289125877, 16.752183247), (39.728465706, 15.691523075))
            Line((39.728465706, 15.691523075), (39.728465706, 9.191523075))
            ThreePointArc((39.728465706, 9.191523075), (39.289125877, 8.130862903), (38.228465706, 7.691523075))
            Line((38.228465706, 7.691523075), (19.024477888, 7.691523075))
            ThreePointArc((19.024477888, 7.691523075), (17.963817716, 8.130862903), (17.524477888, 9.191523075))
            Line((17.524477888, 9.191523075), (17.524477888, 15.691523075))
            ThreePointArc((17.524477888, 15.691523075), (17.963817716, 16.752183247), (19.024477888, 17.191523075))
        make_face(mode=Mode.SUBTRACT)
        with BuildLine():
            Line((19.024477888, 22.618720941), (38.228465706, 22.618720941))
            ThreePointArc((38.228465706, 22.618720941), (39.289125877, 23.058060769), (39.728465706, 24.118720941))
            Line((39.728465706, 24.118720941), (39.728465706, 30.618720941))
            ThreePointArc((39.728465706, 30.618720941), (39.289125877, 31.679381113), (38.228465706, 32.118720941))
            Line((38.228465706, 32.118720941), (19.024477888, 32.118720941))
            ThreePointArc((19.024477888, 32.118720941), (17.963817716, 31.679381113), (17.524477888, 30.618720941))
            Line((17.524477888, 30.618720941), (17.524477888, 24.118720941))
            ThreePointArc((17.524477888, 24.118720941), (17.963817716, 23.058060769), (19.024477888, 22.618720941))
        make_face(mode=Mode.SUBTRACT)
    extrude(amount=EXTRUDE_1_DEPTH)


solid = part.part
